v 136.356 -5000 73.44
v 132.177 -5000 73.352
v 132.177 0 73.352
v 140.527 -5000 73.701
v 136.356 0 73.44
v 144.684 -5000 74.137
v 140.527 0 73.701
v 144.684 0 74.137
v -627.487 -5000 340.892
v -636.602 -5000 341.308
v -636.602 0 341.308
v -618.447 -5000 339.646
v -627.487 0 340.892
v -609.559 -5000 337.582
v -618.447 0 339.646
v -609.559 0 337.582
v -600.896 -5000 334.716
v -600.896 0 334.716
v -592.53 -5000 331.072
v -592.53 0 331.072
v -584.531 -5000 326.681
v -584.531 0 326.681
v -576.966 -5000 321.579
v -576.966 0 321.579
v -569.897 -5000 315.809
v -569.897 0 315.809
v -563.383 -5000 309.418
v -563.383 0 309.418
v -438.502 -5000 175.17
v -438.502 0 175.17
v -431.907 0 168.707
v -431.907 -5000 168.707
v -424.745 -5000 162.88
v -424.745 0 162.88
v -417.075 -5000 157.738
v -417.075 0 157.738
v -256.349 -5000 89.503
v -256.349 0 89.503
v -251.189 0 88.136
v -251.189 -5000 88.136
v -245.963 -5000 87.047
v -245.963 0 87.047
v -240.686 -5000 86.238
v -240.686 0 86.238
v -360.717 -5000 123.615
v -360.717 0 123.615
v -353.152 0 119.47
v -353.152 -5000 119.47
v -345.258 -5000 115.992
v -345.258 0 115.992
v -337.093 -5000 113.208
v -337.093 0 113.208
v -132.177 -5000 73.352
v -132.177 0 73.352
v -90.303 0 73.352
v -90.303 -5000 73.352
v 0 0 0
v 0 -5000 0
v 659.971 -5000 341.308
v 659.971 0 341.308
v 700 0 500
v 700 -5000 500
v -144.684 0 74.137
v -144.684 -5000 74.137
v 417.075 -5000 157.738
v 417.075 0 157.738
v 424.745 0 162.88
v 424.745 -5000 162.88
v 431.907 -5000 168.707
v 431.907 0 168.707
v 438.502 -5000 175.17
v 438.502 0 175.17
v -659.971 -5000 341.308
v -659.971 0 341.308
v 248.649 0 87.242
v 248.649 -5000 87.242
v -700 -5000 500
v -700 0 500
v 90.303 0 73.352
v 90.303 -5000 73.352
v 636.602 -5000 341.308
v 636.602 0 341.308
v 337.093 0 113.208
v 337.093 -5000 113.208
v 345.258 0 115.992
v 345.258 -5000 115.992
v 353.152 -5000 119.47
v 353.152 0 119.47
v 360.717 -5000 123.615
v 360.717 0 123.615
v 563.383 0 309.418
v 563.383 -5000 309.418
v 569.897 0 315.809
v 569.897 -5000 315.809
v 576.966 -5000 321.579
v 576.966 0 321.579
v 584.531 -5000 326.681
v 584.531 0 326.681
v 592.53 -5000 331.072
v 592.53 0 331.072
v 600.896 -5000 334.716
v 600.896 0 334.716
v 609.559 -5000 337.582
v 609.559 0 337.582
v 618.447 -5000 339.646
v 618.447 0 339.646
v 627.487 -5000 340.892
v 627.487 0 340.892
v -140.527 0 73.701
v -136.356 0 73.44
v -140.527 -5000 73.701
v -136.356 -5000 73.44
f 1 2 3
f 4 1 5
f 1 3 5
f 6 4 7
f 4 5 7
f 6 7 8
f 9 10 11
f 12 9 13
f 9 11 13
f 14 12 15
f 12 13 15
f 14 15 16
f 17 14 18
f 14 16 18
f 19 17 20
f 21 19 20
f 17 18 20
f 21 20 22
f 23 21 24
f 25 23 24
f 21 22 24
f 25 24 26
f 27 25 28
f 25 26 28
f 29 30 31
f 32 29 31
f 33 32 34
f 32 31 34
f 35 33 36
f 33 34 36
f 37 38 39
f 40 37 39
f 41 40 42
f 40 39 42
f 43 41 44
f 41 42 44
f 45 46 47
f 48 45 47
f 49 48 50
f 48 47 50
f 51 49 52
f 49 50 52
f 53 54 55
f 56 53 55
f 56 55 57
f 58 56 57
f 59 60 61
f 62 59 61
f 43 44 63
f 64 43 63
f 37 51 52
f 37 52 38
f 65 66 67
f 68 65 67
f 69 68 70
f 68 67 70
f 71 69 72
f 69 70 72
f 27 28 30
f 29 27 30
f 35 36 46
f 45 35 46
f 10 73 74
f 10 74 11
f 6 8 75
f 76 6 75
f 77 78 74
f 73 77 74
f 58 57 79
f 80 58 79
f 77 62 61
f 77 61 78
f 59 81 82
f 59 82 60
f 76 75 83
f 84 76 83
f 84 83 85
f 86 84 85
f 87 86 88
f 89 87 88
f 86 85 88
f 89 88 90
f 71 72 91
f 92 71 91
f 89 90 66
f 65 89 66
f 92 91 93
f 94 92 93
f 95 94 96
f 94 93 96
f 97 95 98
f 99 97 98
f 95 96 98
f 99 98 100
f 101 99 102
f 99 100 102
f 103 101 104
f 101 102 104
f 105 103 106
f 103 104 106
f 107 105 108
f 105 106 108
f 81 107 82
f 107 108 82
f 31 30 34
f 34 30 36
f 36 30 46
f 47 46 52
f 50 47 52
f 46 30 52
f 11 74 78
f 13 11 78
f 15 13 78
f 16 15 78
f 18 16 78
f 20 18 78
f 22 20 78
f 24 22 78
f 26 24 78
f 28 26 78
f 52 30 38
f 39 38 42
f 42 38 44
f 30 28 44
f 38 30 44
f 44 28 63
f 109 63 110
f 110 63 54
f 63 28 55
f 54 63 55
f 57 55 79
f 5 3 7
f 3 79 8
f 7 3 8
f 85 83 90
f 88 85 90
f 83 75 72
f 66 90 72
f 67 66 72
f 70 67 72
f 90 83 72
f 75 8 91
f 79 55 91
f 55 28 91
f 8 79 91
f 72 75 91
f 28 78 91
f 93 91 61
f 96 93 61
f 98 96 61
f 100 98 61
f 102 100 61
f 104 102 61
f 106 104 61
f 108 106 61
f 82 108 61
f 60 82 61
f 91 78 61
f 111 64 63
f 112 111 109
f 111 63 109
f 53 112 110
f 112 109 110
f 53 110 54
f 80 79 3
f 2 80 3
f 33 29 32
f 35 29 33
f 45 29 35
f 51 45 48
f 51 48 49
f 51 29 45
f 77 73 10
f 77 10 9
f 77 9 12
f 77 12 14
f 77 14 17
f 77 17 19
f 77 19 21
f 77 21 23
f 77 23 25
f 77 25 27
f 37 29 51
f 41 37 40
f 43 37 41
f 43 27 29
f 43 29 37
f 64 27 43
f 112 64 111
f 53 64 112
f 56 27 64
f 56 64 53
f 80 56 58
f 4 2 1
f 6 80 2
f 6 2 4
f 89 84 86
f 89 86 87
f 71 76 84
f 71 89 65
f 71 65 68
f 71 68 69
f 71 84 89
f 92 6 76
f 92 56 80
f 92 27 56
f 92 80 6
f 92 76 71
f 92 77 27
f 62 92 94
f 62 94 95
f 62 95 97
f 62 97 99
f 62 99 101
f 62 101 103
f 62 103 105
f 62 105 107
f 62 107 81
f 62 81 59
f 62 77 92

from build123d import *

# Parameters (mm, degrees)
F2_DEPTH = 5000


with BuildPart() as f2:
    # F0 (on Front) → F2 (new body)
    with BuildSketch(Plane.XZ):
        with BuildLine():
            Line((-90.3032645583, 73.3521804214), (0, 0))
            Line((0, 0), (0, 500))
            Line((0, 500), (-700, 500))
            Line((-700, 500), (-659.9707603455, 341.3078779773))
            Line((-659.9707603455, 341.3078779773), (-636.6021653731, 341.3078779773))
            ThreePointArc((-636.6021653731, 341.3078779773), (-596.6712163725, 332.9894972469), (-563.3834841061, 309.4182642155))
            Line((-563.3834841061, 309.4182642155), (-438.5016734996, 175.1702883654))
            ThreePointArc((-438.5016734996, 175.1702883654), (-428.3932790461, 165.710759699), (-417.0752981876, 157.7379540258))
            Line((-417.0752981876, 157.7379540258), (-360.7167568947, 123.615368327))
            ThreePointArc((-360.7167568947, 123.615368327), (-349.2423377723, 117.6459694815), (-337.0934164626, 113.2075319426))
            Line((-337.0934164626, 113.2075319426), (-256.349216299, 89.5028171123))
            ThreePointArc((-256.349216299, 89.5028171123), (-248.5831629557, 87.5568921429), (-240.6863306004, 86.2384660848))
            Line((-240.6863306004, 86.2384660848), (-144.6835198288, 74.1372724315))
            ThreePointArc((-144.6835198288, 74.1372724315), (-138.4427891974, 73.5486464183), (-132.1774400044, 73.3521804214))
            Line((-132.1774400044, 73.3521804214), (-90.3032645583, 73.3521804214))
        make_face()
        with BuildLine():
            Line((0, 500), (0, 0))
            Line((0, 0), (90.3032645583, 73.3521804214))
            Line((90.3032645583, 73.3521804214), (132.1774400044, 73.3521804214))
            ThreePointArc((132.1774400044, 73.3521804214), (138.4427891974, 73.5486464183), (144.6835198288, 74.1372724315))
            Line((144.6835198288, 74.1372724315), (248.6487627029, 87.2421339154))
            Line((248.6487627029, 87.2421339154), (337.0934164626, 113.2075319426))
            ThreePointArc((337.0934164626, 113.2075319426), (349.2423377723, 117.6459694815), (360.7167568947, 123.615368327))
            Line((360.7167568947, 123.615368327), (417.0752981876, 157.7379540258))
            ThreePointArc((417.0752981876, 157.7379540258), (428.3932790461, 165.710759699), (438.5016734996, 175.1702883654))
            Line((438.5016734996, 175.1702883654), (563.3834841061, 309.4182642155))
            ThreePointArc((563.3834841061, 309.4182642155), (596.6712163725, 332.9894972469), (636.6021653731, 341.3078779773))
            Line((636.6021653731, 341.3078779773), (659.9707603455, 341.3078779773))
            Line((659.9707603455, 341.3078779773), (700, 500))
            Line((700, 500), (0, 500))
        make_face()
    extrude(amount=F2_DEPTH)


solid = f2.part
